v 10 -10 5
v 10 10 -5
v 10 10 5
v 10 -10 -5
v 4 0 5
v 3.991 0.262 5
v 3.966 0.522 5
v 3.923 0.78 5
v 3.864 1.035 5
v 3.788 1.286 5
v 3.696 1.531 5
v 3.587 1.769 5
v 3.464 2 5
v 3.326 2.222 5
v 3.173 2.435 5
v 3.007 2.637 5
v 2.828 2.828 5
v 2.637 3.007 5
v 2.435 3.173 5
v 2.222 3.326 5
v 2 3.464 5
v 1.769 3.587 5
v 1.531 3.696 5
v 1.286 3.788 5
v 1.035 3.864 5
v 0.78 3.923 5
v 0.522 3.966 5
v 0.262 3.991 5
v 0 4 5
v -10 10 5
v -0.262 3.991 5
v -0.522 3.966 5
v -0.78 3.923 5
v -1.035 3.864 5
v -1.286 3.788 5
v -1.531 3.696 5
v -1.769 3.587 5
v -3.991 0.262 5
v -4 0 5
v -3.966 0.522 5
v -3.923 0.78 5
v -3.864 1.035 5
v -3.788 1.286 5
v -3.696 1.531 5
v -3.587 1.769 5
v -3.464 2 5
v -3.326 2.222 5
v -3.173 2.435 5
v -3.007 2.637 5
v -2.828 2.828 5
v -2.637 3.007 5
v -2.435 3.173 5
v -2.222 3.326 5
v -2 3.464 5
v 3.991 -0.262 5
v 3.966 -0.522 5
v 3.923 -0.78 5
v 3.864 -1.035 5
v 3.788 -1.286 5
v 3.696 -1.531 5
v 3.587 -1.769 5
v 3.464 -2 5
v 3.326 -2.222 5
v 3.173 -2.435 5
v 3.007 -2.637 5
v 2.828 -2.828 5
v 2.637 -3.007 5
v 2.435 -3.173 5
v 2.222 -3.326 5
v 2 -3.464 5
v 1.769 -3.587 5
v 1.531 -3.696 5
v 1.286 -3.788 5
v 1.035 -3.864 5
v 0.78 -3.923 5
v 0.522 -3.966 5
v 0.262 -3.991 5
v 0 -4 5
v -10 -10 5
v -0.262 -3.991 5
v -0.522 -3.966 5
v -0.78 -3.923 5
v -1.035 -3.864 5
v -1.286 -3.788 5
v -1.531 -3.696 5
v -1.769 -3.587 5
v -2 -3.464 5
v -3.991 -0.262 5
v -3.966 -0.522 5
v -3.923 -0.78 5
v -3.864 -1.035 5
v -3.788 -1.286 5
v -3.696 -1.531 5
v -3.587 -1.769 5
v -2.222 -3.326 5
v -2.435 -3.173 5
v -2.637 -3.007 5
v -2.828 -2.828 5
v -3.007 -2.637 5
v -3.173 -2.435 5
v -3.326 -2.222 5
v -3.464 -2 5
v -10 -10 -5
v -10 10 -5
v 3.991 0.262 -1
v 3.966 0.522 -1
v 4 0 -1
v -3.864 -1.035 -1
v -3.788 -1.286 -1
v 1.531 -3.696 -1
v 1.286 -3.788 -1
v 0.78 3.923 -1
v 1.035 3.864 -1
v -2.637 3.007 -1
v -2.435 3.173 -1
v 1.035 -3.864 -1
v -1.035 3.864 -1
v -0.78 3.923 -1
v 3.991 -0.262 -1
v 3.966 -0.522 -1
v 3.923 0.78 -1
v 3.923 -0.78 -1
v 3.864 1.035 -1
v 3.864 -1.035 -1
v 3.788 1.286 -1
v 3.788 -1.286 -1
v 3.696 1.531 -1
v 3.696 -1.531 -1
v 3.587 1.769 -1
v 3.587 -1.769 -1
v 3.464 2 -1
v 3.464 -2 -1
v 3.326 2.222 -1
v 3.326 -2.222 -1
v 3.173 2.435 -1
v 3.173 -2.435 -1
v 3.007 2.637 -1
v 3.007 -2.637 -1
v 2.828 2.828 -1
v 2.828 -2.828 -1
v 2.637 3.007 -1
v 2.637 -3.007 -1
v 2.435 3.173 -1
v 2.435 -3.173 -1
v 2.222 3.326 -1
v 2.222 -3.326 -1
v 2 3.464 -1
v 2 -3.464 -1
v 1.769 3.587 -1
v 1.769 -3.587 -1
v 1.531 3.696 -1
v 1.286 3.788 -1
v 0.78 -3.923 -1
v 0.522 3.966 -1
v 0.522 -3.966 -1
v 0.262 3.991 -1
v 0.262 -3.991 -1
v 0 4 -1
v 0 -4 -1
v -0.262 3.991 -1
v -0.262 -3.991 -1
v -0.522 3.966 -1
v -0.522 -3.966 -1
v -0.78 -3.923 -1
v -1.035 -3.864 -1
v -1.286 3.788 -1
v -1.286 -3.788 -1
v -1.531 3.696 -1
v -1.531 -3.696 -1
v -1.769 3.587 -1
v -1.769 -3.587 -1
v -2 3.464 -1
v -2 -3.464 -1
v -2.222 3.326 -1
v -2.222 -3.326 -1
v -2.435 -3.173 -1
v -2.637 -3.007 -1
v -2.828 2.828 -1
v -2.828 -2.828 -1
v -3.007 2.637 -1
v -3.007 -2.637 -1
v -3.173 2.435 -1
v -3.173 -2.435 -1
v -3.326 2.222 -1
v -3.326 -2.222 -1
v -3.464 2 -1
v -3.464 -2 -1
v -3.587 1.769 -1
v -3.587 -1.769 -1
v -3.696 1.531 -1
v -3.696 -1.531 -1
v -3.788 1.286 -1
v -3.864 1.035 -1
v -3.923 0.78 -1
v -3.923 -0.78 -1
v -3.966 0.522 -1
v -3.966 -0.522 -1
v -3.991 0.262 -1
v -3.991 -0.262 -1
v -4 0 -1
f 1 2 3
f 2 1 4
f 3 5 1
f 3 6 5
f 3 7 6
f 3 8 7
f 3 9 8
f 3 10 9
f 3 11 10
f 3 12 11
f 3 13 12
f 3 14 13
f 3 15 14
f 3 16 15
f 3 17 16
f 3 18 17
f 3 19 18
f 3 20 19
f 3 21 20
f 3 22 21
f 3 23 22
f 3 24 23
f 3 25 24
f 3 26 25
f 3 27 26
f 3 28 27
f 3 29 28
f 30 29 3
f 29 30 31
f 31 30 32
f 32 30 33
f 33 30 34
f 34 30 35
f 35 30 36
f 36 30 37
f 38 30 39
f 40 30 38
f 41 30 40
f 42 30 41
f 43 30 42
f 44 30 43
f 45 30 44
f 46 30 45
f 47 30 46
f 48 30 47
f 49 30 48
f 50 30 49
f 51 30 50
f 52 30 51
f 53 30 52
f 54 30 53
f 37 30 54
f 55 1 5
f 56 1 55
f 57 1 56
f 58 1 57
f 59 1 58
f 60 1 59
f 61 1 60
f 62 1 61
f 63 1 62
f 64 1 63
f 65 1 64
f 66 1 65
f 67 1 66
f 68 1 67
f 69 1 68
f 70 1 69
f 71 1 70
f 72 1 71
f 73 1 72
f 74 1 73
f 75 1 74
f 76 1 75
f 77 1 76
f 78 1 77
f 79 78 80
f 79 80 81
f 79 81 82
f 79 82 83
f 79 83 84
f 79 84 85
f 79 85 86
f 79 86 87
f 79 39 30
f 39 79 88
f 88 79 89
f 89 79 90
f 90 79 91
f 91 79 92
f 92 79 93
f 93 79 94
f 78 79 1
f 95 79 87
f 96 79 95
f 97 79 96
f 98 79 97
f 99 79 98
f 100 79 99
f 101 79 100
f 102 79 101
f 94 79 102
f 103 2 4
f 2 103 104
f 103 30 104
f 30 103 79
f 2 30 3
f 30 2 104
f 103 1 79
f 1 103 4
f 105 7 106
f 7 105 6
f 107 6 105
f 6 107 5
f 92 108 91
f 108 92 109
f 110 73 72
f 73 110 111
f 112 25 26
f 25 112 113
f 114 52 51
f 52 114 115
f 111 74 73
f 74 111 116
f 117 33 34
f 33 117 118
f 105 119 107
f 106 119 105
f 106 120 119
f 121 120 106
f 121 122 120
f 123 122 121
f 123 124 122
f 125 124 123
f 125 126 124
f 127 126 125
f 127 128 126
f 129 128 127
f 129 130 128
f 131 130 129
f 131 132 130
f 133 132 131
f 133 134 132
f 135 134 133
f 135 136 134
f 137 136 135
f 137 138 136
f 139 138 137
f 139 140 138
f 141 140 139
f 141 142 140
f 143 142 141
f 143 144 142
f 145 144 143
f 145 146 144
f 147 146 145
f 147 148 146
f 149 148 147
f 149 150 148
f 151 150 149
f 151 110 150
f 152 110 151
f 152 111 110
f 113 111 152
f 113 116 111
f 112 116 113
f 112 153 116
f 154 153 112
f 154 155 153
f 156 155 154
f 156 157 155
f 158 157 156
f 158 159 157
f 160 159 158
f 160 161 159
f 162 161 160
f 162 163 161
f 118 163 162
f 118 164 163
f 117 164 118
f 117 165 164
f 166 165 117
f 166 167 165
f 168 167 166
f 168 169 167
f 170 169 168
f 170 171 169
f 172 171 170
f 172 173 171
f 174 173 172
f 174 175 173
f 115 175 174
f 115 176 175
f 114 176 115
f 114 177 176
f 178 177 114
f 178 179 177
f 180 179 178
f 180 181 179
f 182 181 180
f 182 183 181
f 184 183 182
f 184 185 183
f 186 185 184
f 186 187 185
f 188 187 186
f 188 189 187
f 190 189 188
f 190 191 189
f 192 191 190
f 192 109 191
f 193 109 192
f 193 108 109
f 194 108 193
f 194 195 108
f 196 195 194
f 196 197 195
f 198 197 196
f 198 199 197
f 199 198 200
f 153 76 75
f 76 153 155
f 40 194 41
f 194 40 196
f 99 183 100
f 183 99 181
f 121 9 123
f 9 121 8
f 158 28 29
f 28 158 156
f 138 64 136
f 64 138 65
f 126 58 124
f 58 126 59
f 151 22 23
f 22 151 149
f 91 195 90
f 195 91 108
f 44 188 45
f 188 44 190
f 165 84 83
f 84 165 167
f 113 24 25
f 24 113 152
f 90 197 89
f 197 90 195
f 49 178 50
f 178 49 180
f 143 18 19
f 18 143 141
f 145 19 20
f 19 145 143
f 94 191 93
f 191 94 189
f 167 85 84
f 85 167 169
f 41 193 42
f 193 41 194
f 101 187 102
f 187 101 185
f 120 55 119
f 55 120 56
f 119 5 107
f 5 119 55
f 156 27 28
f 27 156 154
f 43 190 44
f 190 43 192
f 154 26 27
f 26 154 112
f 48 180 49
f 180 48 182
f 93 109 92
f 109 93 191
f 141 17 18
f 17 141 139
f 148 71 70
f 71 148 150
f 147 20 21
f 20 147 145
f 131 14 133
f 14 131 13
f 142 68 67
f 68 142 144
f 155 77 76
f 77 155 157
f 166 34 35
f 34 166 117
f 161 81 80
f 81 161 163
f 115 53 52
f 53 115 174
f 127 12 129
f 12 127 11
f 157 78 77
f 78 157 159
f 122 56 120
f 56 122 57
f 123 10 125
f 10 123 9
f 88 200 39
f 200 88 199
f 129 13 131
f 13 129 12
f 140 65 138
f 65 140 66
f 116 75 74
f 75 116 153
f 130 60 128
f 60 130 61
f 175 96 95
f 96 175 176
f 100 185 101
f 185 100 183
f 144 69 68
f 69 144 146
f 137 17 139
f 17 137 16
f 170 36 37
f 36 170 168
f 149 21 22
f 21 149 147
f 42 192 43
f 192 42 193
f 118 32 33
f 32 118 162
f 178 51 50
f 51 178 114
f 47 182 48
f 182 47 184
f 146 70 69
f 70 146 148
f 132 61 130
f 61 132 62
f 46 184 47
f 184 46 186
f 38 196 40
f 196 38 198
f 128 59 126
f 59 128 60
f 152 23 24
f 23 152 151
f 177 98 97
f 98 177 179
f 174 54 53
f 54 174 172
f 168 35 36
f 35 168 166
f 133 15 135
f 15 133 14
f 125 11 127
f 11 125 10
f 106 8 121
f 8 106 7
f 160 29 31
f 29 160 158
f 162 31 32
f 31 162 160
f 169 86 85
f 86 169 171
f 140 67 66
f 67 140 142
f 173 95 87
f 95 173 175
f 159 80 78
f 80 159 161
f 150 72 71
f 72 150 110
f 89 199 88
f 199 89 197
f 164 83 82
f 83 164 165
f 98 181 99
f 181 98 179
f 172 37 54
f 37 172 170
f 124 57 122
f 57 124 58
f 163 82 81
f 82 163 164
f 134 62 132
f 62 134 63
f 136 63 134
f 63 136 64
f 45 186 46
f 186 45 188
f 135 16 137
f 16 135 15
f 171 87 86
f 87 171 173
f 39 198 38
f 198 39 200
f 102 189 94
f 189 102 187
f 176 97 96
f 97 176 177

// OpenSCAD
// 05 盲孔 —— 顶面向下 Ø8、深 6mm 的平底盲孔（没有贯通）
//
// 真值：它是**盲特征**，不是通道：几何上没有一条"从里通到外"的通路
//       可以被内切圆测量。沿孔轴把切片一路切下去：
//         z ∈ [-1, 5]  切片里是 Ø8 的圆盘 → 内切圆 4.000
//         z >  5       切片里**没有空隙面**（不是"内切圆 = 0"）
//
// 用途：回答"盲腔能不能用内切圆半径 = 0 当判据"。答案是**不能**——
//       切片消失 ≠ 半径 0；把"没有面"读成 0，会把每一个盲特征、
//       以及每一条通道的出口之外，全部判成"通道为零"。
$fn = 96;
difference() {
  cube([20, 20, 10], center = true);
  translate([0, 0, 2]) cylinder(r = 4, h = 6, center = true);   // z ∈ [-1, 5]
}
